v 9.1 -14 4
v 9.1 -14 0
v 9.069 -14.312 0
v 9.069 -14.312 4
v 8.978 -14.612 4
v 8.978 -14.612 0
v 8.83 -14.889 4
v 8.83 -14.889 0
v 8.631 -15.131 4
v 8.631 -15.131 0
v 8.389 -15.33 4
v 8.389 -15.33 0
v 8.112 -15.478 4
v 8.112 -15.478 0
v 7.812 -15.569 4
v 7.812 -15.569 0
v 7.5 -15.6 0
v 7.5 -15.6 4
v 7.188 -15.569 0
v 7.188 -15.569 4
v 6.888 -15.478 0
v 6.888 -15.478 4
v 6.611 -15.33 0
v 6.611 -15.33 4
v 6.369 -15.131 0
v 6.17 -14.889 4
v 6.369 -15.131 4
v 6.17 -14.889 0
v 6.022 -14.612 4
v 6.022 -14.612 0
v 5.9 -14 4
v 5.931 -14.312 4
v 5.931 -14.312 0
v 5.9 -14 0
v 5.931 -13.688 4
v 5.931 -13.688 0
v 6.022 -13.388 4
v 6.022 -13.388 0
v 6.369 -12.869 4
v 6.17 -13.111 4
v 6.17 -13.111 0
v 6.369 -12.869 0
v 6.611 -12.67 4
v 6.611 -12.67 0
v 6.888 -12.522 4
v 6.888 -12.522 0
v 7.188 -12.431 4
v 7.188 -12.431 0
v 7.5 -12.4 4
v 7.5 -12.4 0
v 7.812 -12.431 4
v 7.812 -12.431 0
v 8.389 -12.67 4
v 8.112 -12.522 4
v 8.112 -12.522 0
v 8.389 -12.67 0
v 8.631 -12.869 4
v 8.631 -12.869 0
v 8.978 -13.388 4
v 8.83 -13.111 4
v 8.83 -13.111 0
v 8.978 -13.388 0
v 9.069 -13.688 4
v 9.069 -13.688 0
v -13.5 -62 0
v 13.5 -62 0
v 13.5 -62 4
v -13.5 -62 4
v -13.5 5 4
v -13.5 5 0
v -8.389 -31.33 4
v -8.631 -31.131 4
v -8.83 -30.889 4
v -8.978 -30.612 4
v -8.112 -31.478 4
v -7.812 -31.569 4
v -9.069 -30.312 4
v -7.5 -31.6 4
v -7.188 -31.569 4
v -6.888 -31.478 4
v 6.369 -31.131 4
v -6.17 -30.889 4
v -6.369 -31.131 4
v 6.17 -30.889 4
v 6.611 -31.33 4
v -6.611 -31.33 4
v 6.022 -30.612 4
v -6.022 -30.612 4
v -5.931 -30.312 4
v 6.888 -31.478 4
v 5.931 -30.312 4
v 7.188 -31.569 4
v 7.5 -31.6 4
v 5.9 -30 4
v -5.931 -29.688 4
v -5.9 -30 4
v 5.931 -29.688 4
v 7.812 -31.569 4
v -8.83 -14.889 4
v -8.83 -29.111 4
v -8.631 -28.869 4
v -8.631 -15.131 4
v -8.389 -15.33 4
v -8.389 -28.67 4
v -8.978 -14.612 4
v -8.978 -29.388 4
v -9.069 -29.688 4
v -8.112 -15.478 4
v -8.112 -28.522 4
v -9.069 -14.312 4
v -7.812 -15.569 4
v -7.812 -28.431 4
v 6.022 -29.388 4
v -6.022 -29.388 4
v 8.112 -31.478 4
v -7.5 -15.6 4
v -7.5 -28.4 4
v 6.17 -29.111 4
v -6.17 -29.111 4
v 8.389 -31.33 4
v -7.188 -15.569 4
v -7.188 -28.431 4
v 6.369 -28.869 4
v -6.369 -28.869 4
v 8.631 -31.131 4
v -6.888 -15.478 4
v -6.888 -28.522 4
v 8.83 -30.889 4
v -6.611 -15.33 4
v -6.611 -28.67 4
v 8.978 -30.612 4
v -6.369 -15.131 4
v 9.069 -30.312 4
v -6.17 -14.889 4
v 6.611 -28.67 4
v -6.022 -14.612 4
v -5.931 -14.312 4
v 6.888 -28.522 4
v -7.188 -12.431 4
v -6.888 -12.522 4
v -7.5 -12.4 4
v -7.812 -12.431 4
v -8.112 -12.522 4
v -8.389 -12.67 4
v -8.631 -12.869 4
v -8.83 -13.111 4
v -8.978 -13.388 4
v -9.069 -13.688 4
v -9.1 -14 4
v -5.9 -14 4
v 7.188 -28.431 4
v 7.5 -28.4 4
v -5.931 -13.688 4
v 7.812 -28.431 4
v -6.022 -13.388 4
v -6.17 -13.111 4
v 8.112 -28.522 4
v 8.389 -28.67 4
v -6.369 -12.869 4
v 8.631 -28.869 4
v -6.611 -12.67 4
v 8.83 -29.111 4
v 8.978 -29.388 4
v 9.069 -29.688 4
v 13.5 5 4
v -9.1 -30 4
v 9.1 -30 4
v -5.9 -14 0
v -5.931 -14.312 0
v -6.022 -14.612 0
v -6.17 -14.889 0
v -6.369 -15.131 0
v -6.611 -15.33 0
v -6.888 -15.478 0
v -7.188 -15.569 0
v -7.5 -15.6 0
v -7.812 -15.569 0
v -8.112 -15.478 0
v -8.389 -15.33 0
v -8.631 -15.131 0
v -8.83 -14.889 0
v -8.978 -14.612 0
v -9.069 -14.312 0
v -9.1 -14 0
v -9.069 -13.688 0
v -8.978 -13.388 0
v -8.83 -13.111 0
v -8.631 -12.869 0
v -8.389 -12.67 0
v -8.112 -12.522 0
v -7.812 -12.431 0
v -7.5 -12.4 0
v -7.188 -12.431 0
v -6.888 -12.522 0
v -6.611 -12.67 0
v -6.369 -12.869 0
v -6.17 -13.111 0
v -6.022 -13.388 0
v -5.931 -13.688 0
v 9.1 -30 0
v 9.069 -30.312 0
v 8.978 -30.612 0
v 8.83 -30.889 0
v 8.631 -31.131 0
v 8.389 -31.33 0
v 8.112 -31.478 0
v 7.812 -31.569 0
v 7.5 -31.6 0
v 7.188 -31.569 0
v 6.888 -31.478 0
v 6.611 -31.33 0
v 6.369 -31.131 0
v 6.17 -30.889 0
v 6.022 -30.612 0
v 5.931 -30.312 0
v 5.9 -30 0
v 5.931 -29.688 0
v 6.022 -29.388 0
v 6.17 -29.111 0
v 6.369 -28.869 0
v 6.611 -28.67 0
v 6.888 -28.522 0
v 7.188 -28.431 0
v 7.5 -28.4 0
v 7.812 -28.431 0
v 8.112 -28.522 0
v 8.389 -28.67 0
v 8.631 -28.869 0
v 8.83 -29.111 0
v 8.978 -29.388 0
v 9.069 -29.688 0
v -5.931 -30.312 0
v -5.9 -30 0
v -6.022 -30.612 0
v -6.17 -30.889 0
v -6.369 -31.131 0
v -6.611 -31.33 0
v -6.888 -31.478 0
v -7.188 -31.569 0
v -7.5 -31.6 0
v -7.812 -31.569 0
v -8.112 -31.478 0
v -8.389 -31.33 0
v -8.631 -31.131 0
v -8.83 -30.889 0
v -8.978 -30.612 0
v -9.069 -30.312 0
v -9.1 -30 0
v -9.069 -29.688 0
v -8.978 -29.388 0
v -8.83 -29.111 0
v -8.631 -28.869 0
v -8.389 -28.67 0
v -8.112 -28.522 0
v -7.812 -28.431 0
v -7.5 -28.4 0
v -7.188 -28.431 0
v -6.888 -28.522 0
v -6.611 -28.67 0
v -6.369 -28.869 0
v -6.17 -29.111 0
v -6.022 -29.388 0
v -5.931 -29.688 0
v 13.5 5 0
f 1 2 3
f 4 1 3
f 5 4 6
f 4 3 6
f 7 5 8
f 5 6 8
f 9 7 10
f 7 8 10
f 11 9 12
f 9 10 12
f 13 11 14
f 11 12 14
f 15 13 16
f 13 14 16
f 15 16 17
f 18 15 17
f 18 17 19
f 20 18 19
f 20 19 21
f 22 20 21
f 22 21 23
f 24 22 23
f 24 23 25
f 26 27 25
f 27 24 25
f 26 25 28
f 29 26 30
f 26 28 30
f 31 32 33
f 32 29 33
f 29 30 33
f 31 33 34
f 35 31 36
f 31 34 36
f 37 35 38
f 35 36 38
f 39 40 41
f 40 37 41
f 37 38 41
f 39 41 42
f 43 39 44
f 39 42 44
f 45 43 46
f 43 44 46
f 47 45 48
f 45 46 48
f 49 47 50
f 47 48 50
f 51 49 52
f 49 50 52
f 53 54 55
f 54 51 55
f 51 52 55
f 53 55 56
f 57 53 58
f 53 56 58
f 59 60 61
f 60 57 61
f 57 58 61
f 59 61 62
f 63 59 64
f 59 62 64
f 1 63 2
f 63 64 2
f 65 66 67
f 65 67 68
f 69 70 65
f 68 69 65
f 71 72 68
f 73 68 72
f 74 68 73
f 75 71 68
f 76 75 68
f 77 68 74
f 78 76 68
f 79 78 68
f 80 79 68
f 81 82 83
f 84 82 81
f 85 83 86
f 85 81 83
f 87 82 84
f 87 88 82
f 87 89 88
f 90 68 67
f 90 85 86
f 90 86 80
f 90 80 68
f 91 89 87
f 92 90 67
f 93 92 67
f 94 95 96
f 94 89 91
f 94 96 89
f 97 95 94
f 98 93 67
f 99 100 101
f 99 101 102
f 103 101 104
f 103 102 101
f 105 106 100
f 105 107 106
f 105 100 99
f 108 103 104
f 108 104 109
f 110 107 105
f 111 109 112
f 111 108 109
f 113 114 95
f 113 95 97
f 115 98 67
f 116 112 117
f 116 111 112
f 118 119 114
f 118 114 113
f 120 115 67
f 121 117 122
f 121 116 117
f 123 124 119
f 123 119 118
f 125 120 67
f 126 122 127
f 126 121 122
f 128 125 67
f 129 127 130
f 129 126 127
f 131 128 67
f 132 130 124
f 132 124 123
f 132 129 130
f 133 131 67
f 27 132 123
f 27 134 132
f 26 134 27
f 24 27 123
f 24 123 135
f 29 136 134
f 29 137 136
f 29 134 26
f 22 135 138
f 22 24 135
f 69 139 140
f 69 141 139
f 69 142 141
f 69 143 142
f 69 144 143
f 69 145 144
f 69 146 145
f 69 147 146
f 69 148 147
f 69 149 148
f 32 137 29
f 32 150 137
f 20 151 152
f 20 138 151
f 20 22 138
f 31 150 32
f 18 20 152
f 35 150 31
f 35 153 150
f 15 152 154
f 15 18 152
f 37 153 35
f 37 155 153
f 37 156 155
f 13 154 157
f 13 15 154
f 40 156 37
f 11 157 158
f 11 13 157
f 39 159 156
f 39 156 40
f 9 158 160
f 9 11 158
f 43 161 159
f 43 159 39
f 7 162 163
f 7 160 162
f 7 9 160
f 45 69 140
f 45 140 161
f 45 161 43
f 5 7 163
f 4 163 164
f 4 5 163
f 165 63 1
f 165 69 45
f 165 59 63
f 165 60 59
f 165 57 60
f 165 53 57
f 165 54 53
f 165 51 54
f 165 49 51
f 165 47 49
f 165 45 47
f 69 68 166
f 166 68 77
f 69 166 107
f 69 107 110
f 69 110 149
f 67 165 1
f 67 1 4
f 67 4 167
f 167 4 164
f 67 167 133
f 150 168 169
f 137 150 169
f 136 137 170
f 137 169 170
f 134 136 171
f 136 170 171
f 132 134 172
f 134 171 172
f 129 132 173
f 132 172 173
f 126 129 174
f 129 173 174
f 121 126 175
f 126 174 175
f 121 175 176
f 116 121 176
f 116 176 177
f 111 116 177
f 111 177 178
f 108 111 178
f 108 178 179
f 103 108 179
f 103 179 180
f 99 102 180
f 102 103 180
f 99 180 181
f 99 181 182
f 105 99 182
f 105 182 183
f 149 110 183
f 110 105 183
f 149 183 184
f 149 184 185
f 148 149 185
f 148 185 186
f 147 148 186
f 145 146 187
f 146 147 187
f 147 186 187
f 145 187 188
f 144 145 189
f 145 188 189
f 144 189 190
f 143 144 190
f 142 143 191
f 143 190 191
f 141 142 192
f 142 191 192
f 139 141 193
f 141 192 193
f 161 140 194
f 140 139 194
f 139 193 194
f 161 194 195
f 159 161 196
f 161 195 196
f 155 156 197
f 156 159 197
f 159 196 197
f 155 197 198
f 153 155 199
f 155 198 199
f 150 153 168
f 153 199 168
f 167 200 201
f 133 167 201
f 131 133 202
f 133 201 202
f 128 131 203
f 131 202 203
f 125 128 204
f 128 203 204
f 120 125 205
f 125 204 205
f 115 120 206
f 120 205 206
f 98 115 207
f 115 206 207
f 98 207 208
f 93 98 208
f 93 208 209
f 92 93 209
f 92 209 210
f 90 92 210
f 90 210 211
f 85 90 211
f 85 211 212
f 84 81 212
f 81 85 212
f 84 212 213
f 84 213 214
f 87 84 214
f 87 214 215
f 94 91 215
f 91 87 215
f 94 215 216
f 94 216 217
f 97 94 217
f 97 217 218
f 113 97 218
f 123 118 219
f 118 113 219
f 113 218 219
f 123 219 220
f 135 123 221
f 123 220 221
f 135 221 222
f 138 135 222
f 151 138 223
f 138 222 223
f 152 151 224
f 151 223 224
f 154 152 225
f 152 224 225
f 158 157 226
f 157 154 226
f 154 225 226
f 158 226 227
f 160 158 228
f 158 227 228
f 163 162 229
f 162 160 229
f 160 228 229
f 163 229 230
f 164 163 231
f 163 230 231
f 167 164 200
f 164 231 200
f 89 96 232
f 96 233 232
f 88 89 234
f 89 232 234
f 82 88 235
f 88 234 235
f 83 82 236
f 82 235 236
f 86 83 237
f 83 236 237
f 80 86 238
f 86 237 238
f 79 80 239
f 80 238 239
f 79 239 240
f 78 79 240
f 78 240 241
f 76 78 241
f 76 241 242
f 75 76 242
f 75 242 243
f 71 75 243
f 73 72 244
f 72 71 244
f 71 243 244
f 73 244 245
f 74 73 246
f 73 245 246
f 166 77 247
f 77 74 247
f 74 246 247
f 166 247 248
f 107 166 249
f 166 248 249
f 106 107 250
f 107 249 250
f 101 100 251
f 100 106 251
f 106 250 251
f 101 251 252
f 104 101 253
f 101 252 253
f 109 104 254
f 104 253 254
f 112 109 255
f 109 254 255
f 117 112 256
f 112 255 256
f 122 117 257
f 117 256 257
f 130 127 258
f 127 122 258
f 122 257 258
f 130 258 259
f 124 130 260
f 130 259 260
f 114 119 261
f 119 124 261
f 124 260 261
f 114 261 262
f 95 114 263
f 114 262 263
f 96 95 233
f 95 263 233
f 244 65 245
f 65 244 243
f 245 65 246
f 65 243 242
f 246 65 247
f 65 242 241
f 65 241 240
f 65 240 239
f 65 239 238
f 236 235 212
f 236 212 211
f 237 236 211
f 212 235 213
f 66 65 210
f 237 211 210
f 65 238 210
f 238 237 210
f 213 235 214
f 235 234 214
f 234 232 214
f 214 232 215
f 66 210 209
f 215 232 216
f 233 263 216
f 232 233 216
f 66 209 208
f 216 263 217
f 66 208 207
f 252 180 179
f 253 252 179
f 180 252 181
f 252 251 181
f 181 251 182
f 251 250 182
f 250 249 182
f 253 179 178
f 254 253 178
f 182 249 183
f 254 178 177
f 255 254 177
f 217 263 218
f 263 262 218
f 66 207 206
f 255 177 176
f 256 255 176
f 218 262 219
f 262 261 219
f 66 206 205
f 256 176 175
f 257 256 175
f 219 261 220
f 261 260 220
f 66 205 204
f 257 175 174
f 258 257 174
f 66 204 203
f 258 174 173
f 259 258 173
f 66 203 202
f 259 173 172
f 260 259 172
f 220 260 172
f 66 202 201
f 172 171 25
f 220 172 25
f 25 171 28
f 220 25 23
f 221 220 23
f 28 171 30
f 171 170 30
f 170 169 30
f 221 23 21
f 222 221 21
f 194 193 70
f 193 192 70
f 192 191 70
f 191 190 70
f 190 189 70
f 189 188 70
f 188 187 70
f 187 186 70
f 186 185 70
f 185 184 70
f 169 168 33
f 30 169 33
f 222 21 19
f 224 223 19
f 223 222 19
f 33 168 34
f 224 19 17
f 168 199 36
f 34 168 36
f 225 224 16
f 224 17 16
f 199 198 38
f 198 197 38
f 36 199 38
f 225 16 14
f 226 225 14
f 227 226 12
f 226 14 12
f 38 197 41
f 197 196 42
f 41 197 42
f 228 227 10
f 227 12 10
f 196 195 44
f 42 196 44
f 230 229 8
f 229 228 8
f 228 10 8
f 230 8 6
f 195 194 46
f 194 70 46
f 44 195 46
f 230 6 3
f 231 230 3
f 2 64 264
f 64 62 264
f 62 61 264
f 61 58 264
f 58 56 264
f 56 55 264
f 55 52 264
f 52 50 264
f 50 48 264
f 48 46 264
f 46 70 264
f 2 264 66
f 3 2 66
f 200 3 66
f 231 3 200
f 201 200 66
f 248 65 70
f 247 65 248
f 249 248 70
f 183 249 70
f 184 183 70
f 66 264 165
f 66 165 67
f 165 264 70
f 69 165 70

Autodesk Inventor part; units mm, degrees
ref_plane "YZ Plane" through (0, 0, 0) normal (1, 0, 0) x (0, 1, 0)
ref_plane "XZ Plane" through (0, 0, 0) normal (0, 1, 0) x (-1, 0, 0)
ref_plane "XY Plane" through (0, 0, 0) normal (0, 0, 1) x (1, 0, 0)
sketch "Эскиз1" plane through (0, 0, 0) normal (0, 0, 1) x (1, 0, 0)
  line L0 (13.5, 5) -> (-13.5, 5) projected
  line L1 (-13.5, 5) -> (-13.5, -62) projected
  circle A0 centre (-7.5, -30) radius 1.6 projected
  circle A1 centre (7.5, -30) radius 1.6 projected
  circle A2 centre (7.5, -14) radius 1.6 projected
  circle A3 centre (-7.5, -14) radius 1.6 projected
  circle A4 centre (10, -45) radius 1.6 projected
  circle A5 centre (1, 1) radius 1.6 projected
  circle A6 centre (10, 1) radius 1.6 projected
  circle A7 centre (1, -45) radius 1.6 projected
  line L2 (13.5, 5) -> (13.5, -62) projected
  line L3 (13.5, -62) -> (-13.5, -62) projected
  circle A8 centre (4.75, -56) radius 1.1 projected
  circle A9 centre (-4.75, -56) radius 1.1 projected
  point P0 (0, 0)
  point P1 (13.5, -49)
extrude "Выдавливание1" add sketch "Эскиз1" along normal blind 4 contours L2 L3 L1 L0 | A4 | A5 | A6 | A7 | A8 | A9
properties part number "фанера_креп_маркера" material "Древесина (береза)"
